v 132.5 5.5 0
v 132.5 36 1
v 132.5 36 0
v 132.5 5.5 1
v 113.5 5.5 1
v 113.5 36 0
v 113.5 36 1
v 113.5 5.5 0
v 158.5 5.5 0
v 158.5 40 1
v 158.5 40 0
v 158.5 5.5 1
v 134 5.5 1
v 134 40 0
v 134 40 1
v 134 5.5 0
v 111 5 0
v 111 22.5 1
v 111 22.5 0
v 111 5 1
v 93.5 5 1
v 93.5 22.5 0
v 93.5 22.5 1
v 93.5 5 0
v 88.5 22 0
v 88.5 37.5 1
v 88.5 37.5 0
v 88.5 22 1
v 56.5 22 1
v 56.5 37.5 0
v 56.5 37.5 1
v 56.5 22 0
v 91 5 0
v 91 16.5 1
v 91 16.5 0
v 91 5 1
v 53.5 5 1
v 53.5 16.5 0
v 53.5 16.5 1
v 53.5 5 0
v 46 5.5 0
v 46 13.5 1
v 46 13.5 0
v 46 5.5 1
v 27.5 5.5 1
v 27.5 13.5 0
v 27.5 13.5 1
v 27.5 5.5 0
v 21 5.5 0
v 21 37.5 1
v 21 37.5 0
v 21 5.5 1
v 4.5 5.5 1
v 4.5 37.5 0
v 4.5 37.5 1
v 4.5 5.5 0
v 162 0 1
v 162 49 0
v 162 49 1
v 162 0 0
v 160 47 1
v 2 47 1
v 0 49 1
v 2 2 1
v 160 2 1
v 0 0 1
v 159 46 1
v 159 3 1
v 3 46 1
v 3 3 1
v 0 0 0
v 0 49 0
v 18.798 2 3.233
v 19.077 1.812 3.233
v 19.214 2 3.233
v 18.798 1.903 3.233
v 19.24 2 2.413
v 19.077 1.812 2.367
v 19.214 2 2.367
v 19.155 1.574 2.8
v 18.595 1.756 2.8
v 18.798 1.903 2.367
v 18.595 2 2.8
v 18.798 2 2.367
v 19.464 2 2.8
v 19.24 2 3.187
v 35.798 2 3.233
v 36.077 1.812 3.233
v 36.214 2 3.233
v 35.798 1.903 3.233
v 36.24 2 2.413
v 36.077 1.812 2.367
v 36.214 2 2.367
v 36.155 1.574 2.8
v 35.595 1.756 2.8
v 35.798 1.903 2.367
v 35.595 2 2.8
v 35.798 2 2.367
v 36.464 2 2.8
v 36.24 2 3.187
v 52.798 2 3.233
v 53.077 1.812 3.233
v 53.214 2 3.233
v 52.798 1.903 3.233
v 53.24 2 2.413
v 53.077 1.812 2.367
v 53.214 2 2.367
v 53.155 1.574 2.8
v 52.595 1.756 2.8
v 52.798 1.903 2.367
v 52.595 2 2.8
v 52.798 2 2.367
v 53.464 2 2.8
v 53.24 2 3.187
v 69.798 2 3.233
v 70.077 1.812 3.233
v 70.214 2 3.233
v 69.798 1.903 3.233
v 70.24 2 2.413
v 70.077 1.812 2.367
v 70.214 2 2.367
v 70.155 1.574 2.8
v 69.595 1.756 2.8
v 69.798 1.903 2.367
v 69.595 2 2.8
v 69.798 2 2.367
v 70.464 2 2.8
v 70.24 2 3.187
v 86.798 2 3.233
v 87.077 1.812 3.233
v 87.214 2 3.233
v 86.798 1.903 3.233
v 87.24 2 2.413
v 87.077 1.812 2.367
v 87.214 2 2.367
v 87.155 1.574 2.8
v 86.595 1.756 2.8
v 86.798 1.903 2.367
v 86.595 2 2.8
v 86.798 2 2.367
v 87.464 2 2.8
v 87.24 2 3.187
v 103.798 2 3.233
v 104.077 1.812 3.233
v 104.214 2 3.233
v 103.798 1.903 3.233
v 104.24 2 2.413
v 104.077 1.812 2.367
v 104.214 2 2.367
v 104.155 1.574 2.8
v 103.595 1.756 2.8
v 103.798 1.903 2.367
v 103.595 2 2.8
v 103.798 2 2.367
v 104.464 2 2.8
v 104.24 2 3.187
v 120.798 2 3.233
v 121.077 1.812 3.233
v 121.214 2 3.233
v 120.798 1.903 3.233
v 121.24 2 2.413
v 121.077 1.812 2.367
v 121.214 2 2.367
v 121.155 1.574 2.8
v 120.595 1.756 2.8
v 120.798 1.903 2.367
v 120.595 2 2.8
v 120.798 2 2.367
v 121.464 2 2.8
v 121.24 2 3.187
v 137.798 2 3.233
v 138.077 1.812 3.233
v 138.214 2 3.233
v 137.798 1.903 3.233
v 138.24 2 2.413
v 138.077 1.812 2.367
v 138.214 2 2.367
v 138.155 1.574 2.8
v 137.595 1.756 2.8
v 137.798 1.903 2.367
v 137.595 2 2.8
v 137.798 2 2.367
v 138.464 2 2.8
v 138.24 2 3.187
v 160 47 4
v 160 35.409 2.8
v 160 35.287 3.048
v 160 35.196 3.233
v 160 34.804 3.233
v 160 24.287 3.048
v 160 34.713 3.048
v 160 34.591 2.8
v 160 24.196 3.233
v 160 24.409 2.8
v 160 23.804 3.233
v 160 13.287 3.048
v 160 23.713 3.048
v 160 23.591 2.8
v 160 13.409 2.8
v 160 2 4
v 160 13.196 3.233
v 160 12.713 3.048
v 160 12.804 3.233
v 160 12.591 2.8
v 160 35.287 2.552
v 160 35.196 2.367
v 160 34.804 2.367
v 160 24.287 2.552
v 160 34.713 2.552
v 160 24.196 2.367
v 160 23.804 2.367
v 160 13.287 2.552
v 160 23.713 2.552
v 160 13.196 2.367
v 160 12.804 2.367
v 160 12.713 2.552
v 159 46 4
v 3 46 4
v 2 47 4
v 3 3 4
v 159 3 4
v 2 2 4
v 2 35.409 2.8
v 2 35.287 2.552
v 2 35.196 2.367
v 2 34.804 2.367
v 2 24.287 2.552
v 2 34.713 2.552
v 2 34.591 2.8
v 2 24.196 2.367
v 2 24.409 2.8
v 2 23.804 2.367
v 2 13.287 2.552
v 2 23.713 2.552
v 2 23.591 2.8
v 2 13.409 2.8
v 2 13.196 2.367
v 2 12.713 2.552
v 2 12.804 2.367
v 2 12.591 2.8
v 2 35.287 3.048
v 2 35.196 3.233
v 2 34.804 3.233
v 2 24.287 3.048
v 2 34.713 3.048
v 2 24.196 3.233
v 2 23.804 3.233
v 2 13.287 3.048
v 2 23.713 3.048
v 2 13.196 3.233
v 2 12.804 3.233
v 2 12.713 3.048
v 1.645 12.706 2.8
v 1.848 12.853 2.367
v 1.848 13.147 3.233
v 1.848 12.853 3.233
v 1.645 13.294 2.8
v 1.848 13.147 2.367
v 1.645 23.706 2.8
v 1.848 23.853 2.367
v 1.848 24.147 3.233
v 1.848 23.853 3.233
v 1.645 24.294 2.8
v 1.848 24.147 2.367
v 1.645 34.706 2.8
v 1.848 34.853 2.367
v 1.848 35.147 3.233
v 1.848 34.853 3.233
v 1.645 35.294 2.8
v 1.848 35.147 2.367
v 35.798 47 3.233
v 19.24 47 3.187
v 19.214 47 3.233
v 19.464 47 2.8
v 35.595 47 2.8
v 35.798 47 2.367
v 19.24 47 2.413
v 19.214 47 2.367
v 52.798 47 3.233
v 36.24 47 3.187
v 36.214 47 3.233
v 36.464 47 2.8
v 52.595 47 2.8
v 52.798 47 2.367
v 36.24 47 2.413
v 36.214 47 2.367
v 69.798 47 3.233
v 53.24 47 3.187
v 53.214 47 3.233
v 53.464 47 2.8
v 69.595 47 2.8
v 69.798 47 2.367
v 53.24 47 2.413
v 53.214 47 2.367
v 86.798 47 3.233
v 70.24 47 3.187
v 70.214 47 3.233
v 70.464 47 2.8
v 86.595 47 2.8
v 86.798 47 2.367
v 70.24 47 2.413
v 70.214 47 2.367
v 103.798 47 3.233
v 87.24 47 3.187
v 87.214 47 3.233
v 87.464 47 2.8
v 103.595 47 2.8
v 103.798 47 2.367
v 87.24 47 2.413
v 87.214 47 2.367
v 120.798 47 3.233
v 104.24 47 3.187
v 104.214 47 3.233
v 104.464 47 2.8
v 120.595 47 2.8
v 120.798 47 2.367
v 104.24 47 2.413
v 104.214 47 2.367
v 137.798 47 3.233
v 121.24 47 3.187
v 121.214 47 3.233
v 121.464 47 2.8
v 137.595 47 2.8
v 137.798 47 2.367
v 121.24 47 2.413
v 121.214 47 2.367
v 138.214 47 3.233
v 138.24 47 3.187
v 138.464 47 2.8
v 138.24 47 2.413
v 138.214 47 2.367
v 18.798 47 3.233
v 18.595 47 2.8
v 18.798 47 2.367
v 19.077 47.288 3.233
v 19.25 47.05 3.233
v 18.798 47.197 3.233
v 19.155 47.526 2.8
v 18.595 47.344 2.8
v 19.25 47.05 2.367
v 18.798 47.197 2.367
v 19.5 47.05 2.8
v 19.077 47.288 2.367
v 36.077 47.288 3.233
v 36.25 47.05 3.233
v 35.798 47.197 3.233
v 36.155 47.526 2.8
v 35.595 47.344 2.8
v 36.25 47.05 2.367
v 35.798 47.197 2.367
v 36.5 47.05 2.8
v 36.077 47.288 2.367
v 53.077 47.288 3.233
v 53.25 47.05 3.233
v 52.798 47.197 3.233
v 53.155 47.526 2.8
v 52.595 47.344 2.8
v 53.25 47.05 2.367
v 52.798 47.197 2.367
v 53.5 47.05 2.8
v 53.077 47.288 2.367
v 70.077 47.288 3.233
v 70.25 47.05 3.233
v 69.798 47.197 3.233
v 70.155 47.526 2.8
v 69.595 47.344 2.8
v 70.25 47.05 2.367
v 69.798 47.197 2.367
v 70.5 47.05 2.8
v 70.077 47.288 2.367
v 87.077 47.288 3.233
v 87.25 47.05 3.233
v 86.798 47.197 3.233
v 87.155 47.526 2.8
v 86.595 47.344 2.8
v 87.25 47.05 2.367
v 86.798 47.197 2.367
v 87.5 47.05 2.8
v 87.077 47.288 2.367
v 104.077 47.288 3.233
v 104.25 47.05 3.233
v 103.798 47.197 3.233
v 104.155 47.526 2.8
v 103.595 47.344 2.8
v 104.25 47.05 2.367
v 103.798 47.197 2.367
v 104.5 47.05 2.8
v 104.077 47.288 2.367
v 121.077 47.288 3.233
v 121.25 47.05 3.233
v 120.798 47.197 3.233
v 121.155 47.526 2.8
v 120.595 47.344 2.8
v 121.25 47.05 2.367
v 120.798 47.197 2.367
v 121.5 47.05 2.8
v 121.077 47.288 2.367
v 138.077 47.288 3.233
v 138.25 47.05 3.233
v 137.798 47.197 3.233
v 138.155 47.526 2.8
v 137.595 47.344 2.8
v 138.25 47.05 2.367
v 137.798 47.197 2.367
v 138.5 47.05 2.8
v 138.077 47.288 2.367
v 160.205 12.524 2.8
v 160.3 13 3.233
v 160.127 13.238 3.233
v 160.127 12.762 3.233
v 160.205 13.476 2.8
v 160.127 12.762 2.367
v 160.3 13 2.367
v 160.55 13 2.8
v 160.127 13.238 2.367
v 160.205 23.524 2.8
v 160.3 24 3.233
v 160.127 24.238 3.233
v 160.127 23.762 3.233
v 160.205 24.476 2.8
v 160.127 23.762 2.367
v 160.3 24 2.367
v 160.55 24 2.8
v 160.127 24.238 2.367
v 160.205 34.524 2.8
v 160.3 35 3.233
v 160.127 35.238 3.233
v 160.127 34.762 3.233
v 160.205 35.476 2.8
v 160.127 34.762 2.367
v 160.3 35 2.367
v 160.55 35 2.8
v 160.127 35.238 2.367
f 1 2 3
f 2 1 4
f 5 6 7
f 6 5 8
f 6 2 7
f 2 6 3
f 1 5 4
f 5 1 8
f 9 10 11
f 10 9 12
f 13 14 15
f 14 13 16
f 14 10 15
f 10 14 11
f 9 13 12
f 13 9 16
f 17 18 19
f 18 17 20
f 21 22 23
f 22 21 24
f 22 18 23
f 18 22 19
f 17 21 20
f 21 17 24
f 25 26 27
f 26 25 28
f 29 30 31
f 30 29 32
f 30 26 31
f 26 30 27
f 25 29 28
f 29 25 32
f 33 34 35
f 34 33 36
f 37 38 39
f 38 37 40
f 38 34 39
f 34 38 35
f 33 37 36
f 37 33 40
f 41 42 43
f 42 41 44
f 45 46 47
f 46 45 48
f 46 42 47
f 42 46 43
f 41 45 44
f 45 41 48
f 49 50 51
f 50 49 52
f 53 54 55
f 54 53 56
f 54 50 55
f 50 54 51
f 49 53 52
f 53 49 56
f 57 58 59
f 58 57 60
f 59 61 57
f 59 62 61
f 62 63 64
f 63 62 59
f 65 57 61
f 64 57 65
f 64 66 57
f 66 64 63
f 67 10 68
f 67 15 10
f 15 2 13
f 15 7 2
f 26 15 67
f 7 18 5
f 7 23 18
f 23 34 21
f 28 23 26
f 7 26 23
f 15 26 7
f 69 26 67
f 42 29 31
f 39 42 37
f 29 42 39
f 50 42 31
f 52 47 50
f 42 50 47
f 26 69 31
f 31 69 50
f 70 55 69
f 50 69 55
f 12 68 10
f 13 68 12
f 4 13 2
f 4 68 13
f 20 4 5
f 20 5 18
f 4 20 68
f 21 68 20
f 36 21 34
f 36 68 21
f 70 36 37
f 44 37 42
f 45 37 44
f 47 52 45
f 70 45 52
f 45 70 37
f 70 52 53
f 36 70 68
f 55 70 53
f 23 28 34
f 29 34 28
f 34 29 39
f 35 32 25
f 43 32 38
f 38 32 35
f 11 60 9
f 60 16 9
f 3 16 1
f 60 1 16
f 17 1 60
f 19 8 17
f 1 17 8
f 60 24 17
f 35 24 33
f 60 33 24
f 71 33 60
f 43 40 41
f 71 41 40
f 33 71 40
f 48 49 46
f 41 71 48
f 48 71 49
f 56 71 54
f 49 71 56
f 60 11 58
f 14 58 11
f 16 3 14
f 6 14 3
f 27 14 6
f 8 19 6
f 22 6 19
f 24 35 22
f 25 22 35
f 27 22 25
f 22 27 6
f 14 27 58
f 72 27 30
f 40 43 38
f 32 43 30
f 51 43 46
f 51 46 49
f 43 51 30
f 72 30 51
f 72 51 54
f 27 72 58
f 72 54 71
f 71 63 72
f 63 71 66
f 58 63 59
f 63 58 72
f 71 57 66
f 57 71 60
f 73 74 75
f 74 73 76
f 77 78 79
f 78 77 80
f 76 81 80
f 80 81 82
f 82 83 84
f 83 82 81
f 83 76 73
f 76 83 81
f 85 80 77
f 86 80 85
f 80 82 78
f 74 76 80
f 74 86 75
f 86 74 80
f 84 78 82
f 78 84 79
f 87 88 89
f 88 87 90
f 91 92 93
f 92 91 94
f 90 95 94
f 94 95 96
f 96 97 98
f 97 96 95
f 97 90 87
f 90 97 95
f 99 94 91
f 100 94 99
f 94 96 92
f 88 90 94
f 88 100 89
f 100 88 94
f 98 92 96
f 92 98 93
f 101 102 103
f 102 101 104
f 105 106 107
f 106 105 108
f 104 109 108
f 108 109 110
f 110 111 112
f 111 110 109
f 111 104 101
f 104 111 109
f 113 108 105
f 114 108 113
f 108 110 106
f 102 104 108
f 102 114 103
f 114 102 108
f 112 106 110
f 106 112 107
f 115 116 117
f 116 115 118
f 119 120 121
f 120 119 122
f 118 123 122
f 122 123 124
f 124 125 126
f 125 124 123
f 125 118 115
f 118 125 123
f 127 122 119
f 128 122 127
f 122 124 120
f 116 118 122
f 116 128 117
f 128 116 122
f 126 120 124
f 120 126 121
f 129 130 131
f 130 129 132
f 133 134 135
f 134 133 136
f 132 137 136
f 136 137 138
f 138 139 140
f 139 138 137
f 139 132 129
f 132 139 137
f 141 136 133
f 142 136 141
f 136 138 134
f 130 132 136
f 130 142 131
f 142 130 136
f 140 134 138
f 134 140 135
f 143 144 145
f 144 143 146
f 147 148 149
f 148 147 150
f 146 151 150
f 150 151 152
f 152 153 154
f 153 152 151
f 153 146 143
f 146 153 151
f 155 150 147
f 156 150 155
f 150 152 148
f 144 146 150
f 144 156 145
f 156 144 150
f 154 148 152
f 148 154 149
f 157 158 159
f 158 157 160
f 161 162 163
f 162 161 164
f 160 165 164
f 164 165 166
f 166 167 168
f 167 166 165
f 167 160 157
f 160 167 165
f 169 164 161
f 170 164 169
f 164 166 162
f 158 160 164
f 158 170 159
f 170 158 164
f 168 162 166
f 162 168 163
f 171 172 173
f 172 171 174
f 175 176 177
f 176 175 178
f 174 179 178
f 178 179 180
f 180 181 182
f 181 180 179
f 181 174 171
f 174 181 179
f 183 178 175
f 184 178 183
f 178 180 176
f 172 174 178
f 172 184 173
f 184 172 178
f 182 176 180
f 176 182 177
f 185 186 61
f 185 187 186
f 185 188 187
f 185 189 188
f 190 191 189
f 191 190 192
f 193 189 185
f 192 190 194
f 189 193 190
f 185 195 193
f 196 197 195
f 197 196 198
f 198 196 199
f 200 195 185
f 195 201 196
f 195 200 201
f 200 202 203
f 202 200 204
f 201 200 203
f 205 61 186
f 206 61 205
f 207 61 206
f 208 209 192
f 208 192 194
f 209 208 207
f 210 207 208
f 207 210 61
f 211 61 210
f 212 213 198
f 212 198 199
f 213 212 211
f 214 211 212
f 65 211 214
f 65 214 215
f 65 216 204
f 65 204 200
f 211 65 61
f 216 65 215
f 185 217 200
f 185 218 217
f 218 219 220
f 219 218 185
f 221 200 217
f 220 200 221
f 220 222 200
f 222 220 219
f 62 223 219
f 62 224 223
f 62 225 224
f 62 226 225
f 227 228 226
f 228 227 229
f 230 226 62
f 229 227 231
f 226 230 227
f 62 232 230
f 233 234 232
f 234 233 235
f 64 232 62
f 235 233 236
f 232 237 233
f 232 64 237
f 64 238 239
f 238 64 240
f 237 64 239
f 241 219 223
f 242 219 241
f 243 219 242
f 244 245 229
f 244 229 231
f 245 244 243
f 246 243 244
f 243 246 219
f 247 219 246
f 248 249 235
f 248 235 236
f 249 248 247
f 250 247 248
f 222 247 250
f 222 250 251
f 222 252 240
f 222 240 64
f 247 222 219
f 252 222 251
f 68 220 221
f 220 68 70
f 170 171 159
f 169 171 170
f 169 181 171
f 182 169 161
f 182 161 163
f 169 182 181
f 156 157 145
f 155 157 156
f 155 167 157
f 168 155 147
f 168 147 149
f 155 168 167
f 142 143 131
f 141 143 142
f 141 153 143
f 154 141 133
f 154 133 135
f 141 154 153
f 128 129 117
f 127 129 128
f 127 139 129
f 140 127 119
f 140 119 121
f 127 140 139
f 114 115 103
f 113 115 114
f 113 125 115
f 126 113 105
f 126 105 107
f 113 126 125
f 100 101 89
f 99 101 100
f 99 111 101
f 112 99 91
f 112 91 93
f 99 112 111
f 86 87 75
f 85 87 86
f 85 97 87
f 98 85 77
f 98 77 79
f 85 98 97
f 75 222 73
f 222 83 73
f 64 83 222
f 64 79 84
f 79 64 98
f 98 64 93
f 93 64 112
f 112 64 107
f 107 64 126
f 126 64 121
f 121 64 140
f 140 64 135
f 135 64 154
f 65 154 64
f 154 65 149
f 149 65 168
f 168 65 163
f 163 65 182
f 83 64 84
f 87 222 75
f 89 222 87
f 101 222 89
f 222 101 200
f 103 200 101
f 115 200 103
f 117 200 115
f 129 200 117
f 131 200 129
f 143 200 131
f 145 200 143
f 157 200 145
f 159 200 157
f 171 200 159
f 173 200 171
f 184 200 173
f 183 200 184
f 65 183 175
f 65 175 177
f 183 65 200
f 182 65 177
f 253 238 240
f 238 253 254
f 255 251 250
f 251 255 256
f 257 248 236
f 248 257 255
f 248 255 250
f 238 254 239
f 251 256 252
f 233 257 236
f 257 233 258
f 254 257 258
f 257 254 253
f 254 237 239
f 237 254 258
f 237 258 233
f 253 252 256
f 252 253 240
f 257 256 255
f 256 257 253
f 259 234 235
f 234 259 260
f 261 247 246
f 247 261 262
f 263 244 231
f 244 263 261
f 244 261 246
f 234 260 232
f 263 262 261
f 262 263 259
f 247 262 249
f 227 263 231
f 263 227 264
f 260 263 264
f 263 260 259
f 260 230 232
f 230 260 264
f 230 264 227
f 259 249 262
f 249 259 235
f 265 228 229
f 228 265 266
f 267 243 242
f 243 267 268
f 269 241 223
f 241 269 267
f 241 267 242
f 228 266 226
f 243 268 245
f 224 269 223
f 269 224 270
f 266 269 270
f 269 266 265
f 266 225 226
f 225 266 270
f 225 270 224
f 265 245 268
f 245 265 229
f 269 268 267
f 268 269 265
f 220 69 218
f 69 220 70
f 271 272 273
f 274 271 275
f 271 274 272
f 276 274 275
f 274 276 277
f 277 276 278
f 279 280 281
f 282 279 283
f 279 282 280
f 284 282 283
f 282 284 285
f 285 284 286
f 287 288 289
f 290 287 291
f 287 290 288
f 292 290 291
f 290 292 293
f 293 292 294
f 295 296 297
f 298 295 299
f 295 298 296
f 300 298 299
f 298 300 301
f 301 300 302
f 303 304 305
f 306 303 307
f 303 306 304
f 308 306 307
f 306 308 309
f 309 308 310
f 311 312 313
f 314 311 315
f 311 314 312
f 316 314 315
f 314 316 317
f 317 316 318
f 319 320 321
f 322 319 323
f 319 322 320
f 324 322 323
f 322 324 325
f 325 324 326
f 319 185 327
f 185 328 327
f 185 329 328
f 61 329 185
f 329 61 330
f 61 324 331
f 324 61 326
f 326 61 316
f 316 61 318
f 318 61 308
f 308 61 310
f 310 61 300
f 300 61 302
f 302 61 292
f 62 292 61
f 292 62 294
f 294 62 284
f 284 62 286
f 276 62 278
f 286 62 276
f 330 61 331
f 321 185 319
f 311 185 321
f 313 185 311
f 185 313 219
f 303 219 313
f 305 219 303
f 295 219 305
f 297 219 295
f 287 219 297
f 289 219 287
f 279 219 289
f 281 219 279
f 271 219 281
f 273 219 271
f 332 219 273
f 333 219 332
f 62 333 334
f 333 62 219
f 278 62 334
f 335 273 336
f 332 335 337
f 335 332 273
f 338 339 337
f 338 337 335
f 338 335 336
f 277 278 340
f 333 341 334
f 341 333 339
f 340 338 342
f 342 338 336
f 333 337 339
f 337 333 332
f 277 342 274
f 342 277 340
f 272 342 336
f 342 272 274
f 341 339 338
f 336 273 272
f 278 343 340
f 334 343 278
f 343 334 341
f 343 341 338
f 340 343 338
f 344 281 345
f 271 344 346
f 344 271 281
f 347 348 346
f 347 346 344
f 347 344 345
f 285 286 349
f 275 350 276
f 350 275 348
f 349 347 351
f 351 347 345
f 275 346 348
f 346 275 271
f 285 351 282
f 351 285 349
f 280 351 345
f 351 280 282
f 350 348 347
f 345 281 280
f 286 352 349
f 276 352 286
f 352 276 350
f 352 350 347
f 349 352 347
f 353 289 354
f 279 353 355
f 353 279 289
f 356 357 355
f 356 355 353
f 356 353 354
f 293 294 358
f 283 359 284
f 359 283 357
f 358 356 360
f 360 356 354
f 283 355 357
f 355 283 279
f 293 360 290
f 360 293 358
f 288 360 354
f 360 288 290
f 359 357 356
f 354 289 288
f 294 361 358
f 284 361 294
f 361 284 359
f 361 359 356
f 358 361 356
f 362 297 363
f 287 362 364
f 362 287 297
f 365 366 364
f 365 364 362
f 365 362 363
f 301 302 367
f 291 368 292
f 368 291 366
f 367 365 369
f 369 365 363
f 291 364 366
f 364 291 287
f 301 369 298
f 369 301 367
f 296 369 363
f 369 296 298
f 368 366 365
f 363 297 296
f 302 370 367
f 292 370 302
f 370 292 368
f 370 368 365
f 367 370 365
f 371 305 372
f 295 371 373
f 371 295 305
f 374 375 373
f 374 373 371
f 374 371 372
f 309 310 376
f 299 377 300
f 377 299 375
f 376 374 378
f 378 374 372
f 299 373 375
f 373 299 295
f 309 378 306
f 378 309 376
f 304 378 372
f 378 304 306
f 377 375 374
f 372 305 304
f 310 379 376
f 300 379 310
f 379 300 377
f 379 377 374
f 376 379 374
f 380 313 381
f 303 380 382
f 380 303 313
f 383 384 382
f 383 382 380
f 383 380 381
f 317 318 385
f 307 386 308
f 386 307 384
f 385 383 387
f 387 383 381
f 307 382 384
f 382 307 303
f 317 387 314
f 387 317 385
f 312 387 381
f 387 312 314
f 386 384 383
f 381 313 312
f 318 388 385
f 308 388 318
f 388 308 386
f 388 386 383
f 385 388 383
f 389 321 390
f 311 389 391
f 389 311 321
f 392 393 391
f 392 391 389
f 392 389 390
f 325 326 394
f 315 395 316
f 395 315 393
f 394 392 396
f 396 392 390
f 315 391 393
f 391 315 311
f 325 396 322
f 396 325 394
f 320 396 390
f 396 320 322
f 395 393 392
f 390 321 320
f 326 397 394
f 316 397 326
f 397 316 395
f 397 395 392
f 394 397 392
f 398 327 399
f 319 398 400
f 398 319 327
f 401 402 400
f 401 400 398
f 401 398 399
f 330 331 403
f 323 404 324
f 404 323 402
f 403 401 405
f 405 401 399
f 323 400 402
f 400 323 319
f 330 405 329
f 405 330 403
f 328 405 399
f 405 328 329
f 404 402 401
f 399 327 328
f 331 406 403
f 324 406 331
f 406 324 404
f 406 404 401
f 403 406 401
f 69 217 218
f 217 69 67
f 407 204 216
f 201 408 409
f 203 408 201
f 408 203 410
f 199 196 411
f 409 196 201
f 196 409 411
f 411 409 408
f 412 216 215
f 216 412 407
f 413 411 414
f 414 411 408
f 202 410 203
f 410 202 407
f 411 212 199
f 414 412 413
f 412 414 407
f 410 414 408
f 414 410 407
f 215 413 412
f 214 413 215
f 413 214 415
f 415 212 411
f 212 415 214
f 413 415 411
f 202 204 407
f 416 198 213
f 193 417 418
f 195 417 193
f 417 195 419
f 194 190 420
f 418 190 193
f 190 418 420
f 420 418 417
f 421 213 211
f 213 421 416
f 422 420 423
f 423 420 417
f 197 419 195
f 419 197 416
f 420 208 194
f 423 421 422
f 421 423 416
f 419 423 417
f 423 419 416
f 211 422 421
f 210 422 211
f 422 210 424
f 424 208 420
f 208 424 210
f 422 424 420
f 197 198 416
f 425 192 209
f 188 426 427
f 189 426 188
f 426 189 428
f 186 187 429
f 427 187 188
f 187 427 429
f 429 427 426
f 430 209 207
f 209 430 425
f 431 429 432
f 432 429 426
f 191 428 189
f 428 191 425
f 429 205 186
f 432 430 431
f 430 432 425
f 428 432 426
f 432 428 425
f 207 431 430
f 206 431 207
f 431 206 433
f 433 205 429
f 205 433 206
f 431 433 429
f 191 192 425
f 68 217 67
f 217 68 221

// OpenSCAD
/* [Main] */

// Vector of move(x,y), size(x, y) pairs
cutouts = [ [ [ 1.5, 2.5 ],  [ 16.5, 32 ] ], [ [ 23, 0 ], [ 18.5, 8 ] ], [ [ 26, -0.5 ], [ 37.5, 11.5 ] ], [ [ 3, 17 ], [ 32, 15.5 ] ],[ [ 37, -17 ], [ 17.5, 17.5 ] ], [ [ 20, 0.5 ], [ 19, 30.5 ] ], [ [ 20.5, 0 ], [ 24.5, 34.5 ] ] ];

// Bottom of cutouts to bottom edge 
bottom_offset = 5;

/* [RarelyNeeded] */
// Size of backplate (x, y, z)
backbase = [ 156, 43, 1 ];
// Raised edge thickness
edge_thickness = 1;
// Raised edge height
edge_height = 3;
// Spacing around raised edge
edge_offset = 2;
// Snap-in dots per side
edge_dots = [ 9, 4 ];
// How far up the edge to start dots
dotzratio = .6; // [0:1]

/* [Hidden] */
// origin
origin = [0, 0, 0];
// Shift Dot Sphere
dotshift = .05;
// Dot Sphere Size
dotsize = .5;

backwithedge = [ backbase.x + 2 * (edge_offset + edge_thickness), backbase.y + 2 * (edge_thickness + edge_offset), backbase.z ];
fix_nonmanifold = .2;
backz = backbase.z + fix_nonmanifold;

module addCutouts(cutouts, n) {
    curcutnum = len(cutouts) - n;
    if (n > 0) {
        if (curcutnum == 0) {
          translate([cutouts[curcutnum][0][0], cutouts[curcutnum][0][1], -(fix_nonmanifold) / 2]) {
             cube([cutouts[curcutnum][1][0], cutouts[curcutnum][1][1], backz], false);
              addCutouts(cutouts, n - 1);
          }
        } else {
          translate([cutouts[curcutnum][0][0], cutouts[curcutnum][0][1], 0]) {
             cube([cutouts[curcutnum][1][0], cutouts[curcutnum][1][1], backz], false);
              addCutouts(cutouts, n - 1);
          }
      }
   }
}

module addEdges(edgetrfms, eoff, eheight) {
  for (edgetrfm = edgetrfms) {
     translate([edgetrfm[0][0] + eoff, edgetrfm[0][1] + eoff, edgetrfm[0][2] ]) {
        cube([edgetrfm[1][0], edgetrfm[1][1], eheight ], false);
        spacingx = floor(edgetrfm[1][0] / edgetrfm[2][0]);
        spacingy = floor(edgetrfm[1][1] / edgetrfm[2][1]);
        enddotx = edgetrfm[2][0];
        enddoty = edgetrfm[2][1];
        dshiftx = edgetrfm[0][0] ? dotshift + edge_thickness : dotshift;
        dshifty = edgetrfm[0][1] ? dotshift + edge_thickness : dotshift;
        shiftx = spacingy ? dshiftx: 0;
        shifty = spacingx ? dshifty: 0;
        for (dotoff = [1:((spacingx ? enddotx : enddoty) - 1)]) {
           translate([ spacingx * dotoff + shiftx, spacingy * dotoff + shifty, dotzratio * edge_height]) {
              sphere(dotsize);
            }
         }
     }
  }
}
 translate(origin) {
  union() {
      difference() {
        cube(backwithedge, false);
        translate([edge_offset + edge_thickness, edge_offset + edge_thickness, 0]) {
           addCutouts(cutouts, len(cutouts));
        }
    }
    union() {
      addEdges([ 
        [ [ 0, 0, backbase.z ], [ backbase.x + 2 * edge_thickness, edge_thickness, 0 ], edge_dots ],
        [ [ 0, 0, backbase.z ], [ edge_thickness, backbase.y + 2 * edge_thickness, 0 ], edge_dots ],
        [ [ 0, backbase.y + edge_thickness, backbase.z ], [ backbase.x + 2 * edge_thickness, edge_thickness, 0 ], edge_dots ],
       [ [ backbase.x + edge_thickness, 0, backbase.z ], [ edge_thickness, backbase.y + 2 * edge_thickness, 0 ], edge_dots ] 
      ], edge_offset, edge_height);
    }
  }
};
